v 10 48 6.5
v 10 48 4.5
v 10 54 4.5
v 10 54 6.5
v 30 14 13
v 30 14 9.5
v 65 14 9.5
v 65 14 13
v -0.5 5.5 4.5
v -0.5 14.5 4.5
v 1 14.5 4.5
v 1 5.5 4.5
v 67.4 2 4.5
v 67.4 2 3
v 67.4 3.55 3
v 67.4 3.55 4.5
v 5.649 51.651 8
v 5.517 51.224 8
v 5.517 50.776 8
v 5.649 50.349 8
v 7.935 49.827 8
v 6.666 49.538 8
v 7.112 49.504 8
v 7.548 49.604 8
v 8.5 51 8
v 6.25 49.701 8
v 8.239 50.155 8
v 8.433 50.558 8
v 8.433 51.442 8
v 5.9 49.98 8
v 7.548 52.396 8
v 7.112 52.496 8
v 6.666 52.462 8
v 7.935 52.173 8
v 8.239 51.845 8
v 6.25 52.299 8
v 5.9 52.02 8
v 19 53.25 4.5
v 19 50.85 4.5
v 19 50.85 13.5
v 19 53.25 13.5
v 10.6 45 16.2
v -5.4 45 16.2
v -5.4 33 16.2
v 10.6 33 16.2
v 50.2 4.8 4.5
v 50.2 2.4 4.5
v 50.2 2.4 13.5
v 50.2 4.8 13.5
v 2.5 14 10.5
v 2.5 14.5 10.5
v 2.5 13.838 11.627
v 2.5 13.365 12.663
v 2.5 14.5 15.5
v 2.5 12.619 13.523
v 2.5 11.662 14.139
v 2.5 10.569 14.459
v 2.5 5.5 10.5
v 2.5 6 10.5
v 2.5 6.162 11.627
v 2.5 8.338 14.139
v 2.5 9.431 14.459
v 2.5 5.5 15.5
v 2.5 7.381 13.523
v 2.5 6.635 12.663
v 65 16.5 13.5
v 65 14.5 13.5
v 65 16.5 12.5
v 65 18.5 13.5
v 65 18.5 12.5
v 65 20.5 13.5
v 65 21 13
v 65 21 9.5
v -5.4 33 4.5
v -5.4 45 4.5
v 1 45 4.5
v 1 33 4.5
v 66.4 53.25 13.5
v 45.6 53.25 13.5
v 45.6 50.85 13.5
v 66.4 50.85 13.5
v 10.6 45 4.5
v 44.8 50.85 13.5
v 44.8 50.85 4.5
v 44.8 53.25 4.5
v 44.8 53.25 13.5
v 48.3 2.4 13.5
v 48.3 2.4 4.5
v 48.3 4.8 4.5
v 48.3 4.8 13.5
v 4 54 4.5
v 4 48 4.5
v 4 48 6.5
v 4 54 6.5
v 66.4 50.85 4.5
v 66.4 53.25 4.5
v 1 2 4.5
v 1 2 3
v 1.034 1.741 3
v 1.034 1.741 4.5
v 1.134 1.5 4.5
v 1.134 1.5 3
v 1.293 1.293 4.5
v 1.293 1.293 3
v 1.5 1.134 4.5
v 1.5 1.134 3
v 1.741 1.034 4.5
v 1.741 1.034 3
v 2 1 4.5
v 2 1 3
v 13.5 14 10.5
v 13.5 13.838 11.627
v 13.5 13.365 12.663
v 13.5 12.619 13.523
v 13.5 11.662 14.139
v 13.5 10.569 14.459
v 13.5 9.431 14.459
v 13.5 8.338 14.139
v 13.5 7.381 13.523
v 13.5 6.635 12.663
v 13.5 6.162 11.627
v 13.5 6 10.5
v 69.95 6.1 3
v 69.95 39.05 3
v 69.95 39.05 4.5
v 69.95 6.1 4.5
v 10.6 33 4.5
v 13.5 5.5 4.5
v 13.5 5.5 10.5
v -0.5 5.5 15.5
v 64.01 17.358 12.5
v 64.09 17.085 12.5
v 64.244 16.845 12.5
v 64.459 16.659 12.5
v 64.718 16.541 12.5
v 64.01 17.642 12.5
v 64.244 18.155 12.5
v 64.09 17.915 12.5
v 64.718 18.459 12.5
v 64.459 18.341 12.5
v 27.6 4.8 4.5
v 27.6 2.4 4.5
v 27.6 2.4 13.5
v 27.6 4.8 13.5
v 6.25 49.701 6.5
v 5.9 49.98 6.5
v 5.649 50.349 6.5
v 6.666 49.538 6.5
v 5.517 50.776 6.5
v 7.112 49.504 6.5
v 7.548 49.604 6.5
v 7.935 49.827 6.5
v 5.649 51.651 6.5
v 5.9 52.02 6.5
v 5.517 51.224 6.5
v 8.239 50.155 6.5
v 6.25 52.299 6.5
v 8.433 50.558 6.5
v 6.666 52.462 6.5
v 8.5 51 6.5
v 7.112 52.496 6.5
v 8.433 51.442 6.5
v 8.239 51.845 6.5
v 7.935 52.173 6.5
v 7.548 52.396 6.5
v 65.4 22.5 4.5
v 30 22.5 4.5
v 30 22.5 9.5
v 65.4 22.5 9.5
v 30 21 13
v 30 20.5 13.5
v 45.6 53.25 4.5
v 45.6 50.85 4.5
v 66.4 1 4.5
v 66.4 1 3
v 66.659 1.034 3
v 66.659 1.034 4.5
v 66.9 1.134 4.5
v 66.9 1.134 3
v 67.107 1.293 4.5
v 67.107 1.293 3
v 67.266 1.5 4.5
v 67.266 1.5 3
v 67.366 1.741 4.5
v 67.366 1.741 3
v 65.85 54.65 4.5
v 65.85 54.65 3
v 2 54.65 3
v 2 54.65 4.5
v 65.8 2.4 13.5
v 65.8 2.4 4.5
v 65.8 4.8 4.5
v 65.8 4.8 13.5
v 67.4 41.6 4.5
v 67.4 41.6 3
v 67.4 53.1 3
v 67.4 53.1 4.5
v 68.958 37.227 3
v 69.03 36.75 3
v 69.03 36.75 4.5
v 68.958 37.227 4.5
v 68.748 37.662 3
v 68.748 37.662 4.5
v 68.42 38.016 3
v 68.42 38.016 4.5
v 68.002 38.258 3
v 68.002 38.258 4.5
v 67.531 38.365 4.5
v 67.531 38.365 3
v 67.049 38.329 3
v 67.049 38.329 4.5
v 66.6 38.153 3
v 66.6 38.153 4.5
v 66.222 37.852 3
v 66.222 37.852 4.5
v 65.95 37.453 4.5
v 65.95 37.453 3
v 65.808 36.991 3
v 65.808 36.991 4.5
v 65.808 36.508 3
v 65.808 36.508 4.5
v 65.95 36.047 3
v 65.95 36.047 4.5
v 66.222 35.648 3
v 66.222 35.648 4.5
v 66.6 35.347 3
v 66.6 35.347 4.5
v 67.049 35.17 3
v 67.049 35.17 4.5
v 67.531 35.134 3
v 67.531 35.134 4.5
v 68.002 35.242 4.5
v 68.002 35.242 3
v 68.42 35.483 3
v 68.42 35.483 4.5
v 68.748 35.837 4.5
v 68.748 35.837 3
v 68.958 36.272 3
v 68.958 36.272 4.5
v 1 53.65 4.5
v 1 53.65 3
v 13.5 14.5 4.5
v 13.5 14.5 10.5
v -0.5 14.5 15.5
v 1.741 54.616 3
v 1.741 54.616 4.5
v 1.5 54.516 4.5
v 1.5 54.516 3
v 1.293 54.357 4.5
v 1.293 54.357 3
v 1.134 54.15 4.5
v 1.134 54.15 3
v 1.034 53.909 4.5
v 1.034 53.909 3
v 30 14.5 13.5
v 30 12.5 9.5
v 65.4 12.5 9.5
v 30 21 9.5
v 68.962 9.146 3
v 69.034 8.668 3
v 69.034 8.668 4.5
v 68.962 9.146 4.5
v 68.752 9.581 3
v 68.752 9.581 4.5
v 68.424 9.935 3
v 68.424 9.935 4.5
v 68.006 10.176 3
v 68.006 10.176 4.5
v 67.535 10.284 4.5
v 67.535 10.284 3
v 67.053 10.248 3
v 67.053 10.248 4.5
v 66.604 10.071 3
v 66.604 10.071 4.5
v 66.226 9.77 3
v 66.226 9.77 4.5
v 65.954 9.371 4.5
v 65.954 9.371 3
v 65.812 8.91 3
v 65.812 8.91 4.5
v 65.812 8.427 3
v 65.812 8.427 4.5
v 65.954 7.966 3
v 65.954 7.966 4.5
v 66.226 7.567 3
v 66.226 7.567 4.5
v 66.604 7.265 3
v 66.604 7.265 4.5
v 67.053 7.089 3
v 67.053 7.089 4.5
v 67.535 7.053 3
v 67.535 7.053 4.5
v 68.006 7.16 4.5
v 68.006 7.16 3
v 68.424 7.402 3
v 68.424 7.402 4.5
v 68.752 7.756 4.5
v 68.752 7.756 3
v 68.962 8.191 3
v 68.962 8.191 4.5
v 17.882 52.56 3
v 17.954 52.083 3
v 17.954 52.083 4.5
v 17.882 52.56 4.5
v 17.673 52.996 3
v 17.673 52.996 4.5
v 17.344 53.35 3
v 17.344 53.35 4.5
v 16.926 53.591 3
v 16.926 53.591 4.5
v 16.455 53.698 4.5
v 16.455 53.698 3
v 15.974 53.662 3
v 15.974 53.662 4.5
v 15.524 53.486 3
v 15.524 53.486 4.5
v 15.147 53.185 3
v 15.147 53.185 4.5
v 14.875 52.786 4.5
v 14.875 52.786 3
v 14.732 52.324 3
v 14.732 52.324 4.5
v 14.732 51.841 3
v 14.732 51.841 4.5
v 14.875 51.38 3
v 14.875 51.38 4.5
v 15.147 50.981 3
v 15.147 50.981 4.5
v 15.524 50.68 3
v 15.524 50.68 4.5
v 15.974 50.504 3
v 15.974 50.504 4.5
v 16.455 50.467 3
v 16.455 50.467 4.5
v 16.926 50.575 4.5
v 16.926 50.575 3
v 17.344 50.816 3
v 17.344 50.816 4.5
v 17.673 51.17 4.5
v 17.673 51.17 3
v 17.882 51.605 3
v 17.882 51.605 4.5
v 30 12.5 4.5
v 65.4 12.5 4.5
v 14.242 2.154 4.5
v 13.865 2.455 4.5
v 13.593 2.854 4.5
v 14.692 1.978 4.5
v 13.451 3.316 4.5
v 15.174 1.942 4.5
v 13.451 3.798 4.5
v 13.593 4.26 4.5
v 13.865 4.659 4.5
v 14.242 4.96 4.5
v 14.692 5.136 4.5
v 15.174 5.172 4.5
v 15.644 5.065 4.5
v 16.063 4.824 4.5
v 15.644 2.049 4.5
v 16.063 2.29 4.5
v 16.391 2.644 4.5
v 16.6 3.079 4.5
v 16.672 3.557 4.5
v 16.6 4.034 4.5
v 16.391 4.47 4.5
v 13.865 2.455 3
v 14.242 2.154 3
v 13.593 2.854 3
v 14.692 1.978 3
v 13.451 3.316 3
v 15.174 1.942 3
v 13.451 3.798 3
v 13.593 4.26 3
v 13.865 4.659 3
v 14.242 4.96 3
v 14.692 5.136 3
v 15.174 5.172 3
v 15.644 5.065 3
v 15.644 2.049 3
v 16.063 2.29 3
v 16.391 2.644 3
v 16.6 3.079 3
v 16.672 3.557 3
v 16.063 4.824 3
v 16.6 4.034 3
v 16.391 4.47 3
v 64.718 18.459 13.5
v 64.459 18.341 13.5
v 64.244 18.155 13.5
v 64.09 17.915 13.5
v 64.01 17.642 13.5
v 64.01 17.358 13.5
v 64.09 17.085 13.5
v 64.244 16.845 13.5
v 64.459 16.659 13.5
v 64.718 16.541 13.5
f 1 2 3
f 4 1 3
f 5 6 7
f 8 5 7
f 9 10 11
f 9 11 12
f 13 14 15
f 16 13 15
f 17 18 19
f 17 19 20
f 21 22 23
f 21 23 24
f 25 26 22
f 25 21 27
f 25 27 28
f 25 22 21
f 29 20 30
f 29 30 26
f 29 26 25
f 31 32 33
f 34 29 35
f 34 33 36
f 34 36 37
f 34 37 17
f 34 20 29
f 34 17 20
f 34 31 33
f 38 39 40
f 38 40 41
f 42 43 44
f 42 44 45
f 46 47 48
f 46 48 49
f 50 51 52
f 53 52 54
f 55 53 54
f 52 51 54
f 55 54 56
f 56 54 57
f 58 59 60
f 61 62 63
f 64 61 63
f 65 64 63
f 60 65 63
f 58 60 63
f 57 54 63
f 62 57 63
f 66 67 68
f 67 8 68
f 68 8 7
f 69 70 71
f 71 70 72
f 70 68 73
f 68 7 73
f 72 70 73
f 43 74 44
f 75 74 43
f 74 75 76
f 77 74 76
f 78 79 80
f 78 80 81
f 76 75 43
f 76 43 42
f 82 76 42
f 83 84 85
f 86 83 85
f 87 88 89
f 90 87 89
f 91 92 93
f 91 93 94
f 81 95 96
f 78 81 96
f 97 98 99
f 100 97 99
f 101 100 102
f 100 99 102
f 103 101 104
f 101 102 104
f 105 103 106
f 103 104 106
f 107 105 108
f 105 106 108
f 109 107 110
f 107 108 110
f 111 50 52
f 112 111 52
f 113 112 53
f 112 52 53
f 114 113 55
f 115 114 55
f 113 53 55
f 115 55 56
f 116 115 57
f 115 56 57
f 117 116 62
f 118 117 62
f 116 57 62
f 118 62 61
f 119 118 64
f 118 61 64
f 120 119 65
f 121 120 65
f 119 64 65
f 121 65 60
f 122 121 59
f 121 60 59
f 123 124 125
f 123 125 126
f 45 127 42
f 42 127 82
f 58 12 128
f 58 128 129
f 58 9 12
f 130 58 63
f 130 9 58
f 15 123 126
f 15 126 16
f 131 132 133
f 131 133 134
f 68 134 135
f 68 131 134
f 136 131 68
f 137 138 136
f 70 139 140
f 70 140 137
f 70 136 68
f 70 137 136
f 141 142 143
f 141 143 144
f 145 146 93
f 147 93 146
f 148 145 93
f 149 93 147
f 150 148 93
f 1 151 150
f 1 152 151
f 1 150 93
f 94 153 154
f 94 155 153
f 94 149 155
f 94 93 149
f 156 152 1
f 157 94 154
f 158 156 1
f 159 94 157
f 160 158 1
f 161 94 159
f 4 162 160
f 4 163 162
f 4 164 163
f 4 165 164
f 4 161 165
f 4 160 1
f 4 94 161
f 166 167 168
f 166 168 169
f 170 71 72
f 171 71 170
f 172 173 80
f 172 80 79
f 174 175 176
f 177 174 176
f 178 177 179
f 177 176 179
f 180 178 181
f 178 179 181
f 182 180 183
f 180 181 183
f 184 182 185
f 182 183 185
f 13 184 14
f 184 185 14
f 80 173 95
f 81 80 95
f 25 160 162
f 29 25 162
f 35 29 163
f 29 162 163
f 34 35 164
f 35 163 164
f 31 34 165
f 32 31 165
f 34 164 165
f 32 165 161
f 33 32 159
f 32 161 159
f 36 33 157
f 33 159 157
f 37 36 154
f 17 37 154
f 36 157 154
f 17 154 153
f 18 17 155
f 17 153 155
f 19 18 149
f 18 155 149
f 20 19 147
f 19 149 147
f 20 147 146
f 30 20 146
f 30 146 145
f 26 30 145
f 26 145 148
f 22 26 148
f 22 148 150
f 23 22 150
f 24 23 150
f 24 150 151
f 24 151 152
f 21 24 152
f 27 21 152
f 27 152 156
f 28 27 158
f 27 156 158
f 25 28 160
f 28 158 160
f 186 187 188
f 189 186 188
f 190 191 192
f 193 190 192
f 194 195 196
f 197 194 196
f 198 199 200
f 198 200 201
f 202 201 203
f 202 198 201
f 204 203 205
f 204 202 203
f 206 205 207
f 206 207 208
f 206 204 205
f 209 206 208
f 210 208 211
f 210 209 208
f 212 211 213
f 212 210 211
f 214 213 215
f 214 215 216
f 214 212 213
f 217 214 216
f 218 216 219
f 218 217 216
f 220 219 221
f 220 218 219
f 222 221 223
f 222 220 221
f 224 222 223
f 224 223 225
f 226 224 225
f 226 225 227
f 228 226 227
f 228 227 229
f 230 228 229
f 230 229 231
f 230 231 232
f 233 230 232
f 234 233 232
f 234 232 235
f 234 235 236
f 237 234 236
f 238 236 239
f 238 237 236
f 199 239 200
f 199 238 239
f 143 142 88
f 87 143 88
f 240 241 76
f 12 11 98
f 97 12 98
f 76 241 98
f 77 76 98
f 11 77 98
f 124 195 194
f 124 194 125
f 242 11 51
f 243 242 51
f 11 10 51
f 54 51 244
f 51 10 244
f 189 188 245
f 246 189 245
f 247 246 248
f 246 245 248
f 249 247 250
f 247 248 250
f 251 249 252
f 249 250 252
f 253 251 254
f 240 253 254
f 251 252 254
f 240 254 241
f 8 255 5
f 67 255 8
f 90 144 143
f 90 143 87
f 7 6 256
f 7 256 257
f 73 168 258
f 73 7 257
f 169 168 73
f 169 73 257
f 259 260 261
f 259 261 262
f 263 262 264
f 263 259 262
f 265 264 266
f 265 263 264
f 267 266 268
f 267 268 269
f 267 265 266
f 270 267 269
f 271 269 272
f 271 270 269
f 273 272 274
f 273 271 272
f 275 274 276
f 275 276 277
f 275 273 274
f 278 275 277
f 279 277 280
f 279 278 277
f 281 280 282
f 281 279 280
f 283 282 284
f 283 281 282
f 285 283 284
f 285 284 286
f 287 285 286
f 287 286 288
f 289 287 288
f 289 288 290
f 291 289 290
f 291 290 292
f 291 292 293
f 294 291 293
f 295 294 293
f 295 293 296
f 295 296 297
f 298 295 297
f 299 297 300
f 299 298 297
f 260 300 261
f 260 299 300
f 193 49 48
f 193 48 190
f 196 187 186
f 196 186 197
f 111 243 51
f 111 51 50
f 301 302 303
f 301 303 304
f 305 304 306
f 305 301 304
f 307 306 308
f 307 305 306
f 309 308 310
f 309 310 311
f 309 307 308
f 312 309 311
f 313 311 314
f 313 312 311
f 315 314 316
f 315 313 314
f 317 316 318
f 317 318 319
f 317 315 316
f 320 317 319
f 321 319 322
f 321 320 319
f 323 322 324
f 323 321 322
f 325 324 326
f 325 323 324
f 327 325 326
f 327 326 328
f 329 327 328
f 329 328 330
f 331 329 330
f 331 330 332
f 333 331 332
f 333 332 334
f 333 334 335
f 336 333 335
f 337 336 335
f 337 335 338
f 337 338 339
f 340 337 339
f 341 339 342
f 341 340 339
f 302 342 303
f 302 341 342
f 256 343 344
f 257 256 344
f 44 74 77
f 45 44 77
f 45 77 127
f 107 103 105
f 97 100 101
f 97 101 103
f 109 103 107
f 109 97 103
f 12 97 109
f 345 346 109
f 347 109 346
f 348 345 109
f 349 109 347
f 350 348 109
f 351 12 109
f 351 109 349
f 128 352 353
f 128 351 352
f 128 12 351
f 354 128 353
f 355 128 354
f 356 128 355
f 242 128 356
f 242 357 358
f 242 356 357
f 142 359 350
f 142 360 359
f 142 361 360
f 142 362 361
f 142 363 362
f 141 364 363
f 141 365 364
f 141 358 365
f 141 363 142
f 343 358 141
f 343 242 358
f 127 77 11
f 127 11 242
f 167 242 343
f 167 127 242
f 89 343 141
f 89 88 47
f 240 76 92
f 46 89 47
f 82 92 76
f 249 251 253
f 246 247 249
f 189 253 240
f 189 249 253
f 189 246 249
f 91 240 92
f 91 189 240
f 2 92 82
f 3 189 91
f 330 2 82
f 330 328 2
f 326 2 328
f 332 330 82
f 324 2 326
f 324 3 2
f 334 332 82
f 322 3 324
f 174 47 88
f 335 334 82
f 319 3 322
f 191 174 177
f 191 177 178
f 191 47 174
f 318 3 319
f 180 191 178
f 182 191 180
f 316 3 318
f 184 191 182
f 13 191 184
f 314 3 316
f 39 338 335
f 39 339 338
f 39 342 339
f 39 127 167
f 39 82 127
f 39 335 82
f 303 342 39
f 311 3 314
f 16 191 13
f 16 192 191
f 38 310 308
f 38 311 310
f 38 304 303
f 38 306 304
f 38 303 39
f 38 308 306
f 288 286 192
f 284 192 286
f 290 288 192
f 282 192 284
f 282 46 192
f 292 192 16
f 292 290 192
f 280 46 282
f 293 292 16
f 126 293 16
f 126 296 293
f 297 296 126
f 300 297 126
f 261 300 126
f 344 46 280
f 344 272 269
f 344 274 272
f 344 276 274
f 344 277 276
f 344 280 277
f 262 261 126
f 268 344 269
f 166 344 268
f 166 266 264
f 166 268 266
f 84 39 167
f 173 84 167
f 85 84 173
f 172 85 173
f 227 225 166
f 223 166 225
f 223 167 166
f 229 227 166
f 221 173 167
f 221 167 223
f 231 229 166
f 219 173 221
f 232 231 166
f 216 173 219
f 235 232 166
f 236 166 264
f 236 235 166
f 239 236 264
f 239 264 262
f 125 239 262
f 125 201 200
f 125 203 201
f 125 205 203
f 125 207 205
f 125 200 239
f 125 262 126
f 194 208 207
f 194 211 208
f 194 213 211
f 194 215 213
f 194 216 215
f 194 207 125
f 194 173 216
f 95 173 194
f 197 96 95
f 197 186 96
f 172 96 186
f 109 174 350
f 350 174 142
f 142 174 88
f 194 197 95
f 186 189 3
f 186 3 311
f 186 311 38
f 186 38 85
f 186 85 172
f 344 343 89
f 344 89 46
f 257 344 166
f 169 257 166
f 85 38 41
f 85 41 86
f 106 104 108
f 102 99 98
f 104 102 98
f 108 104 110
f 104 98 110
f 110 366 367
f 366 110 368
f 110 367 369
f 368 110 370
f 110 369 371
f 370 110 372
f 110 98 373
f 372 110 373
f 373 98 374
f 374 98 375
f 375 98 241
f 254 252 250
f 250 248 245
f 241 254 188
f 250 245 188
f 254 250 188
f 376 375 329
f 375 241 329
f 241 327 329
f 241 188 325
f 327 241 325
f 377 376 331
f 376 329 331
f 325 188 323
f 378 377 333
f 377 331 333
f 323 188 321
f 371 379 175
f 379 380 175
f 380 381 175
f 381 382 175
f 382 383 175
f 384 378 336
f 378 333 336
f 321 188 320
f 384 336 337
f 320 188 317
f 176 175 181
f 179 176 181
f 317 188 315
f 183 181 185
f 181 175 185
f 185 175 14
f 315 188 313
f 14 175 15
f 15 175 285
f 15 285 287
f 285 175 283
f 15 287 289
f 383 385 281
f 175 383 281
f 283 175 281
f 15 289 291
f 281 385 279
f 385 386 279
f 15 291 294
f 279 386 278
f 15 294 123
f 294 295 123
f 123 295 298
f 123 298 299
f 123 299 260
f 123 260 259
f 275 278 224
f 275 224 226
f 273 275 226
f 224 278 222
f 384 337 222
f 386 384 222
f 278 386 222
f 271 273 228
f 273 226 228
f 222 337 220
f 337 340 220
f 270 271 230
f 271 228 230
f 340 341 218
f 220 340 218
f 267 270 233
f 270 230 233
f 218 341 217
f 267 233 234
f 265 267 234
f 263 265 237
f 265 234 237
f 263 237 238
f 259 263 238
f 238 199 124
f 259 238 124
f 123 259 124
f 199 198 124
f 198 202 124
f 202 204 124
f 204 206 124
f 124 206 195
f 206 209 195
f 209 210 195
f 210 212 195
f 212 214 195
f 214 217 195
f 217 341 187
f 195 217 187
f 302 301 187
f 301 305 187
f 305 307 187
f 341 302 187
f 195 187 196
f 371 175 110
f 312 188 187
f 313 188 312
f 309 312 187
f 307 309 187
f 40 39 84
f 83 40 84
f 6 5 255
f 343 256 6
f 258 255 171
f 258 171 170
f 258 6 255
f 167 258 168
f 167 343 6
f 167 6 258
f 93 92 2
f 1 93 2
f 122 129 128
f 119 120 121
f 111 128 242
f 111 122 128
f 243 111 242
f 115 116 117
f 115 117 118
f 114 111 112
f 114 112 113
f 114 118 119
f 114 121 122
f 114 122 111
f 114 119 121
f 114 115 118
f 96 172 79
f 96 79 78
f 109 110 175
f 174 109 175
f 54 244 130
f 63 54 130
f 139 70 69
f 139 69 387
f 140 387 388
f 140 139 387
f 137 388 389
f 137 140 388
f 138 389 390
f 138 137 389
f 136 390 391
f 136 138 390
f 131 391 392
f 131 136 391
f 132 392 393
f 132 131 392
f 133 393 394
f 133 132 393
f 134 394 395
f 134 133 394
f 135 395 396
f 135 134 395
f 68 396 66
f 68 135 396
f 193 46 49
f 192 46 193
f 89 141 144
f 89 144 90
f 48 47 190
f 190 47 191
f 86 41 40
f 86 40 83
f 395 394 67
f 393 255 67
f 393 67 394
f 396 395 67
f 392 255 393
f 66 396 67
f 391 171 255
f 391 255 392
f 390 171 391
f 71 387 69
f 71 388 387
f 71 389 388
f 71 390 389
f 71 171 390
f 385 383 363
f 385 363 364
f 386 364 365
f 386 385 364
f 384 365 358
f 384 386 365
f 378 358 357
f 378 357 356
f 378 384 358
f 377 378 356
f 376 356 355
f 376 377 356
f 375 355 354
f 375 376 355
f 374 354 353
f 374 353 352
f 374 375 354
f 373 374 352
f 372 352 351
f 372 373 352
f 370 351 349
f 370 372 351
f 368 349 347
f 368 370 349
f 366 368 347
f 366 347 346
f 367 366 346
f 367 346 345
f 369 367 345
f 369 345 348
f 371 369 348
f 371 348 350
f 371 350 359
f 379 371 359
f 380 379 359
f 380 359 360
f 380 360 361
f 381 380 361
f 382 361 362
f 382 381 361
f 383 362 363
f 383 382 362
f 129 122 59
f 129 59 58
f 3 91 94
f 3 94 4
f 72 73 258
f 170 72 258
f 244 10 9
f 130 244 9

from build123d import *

# Parameters (mm, degrees)
SKETCH_R                   = 1.62
EXTRUDE_SKETCH_DEPTH       = 1.5
RECTANGLE004_W             = 20.8
RECTANGLE004_H             = 2.4
EXTRUDE_RECTANGLE004_DEPTH = 9
EXTRUDE_SKETCH002_DEPTH    = 1
SKETCH001_W                = 35
SKETCH001_H                = 7
EXTRUDE_SKETCH001_DEPTH    = 3
CHAMFER_SIZE               = 0.5
RECTANGLE006_W             = 35.4
RECTANGLE006_H             = 10
EXTRUDE_RECTANGLE006_DEPTH = 5
RECTANGLE001_W             = 15.6
RECTANGLE001_H             = 2.4
EXTRUDE_RECTANGLE001_DEPTH = 9
RECTANGLE_W                = 20.7
RECTANGLE_H                = 2.4
EXTRUDE_RECTANGLE_DEPTH    = 9
RECTANGLE009_W             = 9
RECTANGLE009_H             = 11
EXTRUDE_RECTANGLE009_DEPTH = 3
EXTRUDE_SKETCH005_DEPTH    = 11
RECTANGLE008_W             = 16
RECTANGLE008_H             = 12
EXTRUDE_RECTANGLE008_DEPTH = 11.7
SKETCH003_W                = 6
SKETCH003_H                = 6
EXTRUDE_SKETCH003_DEPTH    = 2
SKETCH004_R                = 1.5
EXTRUDE_SKETCH004_DEPTH    = 1.5
RECTANGLE003_W             = 25.8
RECTANGLE003_H             = 2.4
EXTRUDE_RECTANGLE003_DEPTH = 9


with BuildPart() as sketch_extrude:
    # Sketch → Extrude_Sketch (new body)
    with BuildSketch(Plane.XY):
        with BuildLine():
            Line((1, 0), (65.4, 0))
            ThreePointArc((65.4, 0), (66.107107, 0.292893), (66.4, 1))
            Line((66.4, 1), (66.4, 2.55))
            Line((68.95, 5.1), (66.4, 2.55))
            Line((68.95, 38.05), (68.95, 5.1))
            Line((66.4, 40.6), (68.95, 38.05))
            Line((66.4, 40.6), (66.4, 52.1))
            Line((64.85, 53.65), (66.4, 52.1))
            Line((64.85, 53.65), (1, 53.65))
            ThreePointArc((1, 53.65), (0.292893, 53.357107), (0, 52.65))
            Line((0, 52.65), (0, 1))
            ThreePointArc((0, 1), (0.292893, 0.292893), (1, 0))
        make_face()
        with Locations((14.05247, 2.556984)):
            Circle(SKETCH_R, mode=Mode.SUBTRACT)
        with Locations((15.334135, 51.082933)):
            Circle(SKETCH_R, mode=Mode.SUBTRACT)
        with Locations((66.409951, 35.749834)):
            Circle(SKETCH_R, mode=Mode.SUBTRACT)
        with Locations((66.413926, 7.668398)):
            Circle(SKETCH_R, mode=Mode.SUBTRACT)
    extrude(amount=EXTRUDE_SKETCH_DEPTH)


with BuildPart() as rectangle004_extrude:
    # Rectangle004 (on Extrude_Sketch) → Extrude_Rectangle004 (new body)
    with BuildSketch(Plane(origin=(44.6, 49.85, 1.5), x_dir=(1, 0, 0), z_dir=(0, 0, 1))):
        with Locations((10.4, 1.2)):
            Rectangle(RECTANGLE004_W, RECTANGLE004_H)
    extrude(amount=EXTRUDE_RECTANGLE004_DEPTH)


with BuildPart() as sketch002_extrude:
    # Sketch002 (on Face6 of Extrude_Sketch001) → Extrude_Sketch002 (new body)
    with BuildSketch(Plane.XY.offset(9.5)):
        with BuildLine():
            Line((29, 13), (64, 13))
            Line((64, 13), (64, 15.5))
            ThreePointArc((64, 17.5), (63, 16.5), (64, 15.5))
            Line((64, 17.5), (64, 20))
            Line((64, 20), (29, 20))
            Line((29, 20), (29, 13))
        make_face()
    extrude(amount=EXTRUDE_SKETCH002_DEPTH)


with BuildPart() as chamfer_body:
    # Sketch001 (on Face6 of Extrude_Rectangle006) → Extrude_Sketch001 (new body)
    with BuildSketch(Plane.XY.offset(6.5)):
        with Locations((46.5, 16.5)):
            Rectangle(SKETCH001_W, SKETCH001_H)
    extrude(amount=EXTRUDE_SKETCH001_DEPTH)

    # Fusion: union Sketch002_Extrude
    add(sketch002_extrude.part)

    # Chamfer
    chamfer_edges = [chamfer_body.edges().sort_by_distance(p)[0] for p in [
        (46.5, 13, 10.5),
        (46.5, 20, 10.5),
    ]]
    chamfer(chamfer_edges, length=CHAMFER_SIZE)


with BuildPart() as rectangle006_extrude:
    # Rectangle006 (on Extrude_Sketch) → Extrude_Rectangle006 (new body)
    with BuildSketch(Plane(origin=(29, 11.5, 1.5), x_dir=(1, 0, 0), z_dir=(0, 0, 1))):
        with Locations((17.7, 5)):
            Rectangle(RECTANGLE006_W, RECTANGLE006_H)
    extrude(amount=EXTRUDE_RECTANGLE006_DEPTH)


with BuildPart() as rectangle001_extrude:
    # Rectangle001 (on Extrude_Sketch) → Extrude_Rectangle001 (new body)
    with BuildSketch(Plane(origin=(49.2, 1.4, 1.5), x_dir=(1, 0, 0), z_dir=(0, 0, 1))):
        with Locations((7.8, 1.2)):
            Rectangle(RECTANGLE001_W, RECTANGLE001_H)
    extrude(amount=EXTRUDE_RECTANGLE001_DEPTH)


with BuildPart() as rectangle_extrude:
    # Rectangle (on Extrude_Sketch) → Extrude_Rectangle (new body)
    with BuildSketch(Plane(origin=(26.6, 1.4, 1.5), x_dir=(1, 0, 0), z_dir=(0, 0, 1))):
        with Locations((10.35, 1.2)):
            Rectangle(RECTANGLE_W, RECTANGLE_H)
    extrude(amount=EXTRUDE_RECTANGLE_DEPTH)


with BuildPart() as rectangle009_extrude:
    # Rectangle009 (on Extrude_Sketch) → Extrude_Rectangle009 (new body)
    with BuildSketch(Plane(origin=(-1.5, 13.5, 1.5), x_dir=(0, -1, 0), z_dir=(-1, 0, 0))):
        with Locations((4.5, 5.5)):
            Rectangle(RECTANGLE009_W, RECTANGLE009_H)
    extrude(amount=-EXTRUDE_RECTANGLE009_DEPTH)


with BuildPart() as fusion001:
    # Sketch005 (on Face6 of Extrude_Rectangle009) → Extrude_Sketch005 (new body)
    with BuildSketch(Plane.YZ.offset(1.5)):
        with BuildLine():
            Line((4.5, 1.5), (13.5, 1.5))
            Line((13.5, 1.5), (13.5, 7.5))
            Line((13.5, 7.5), (13, 7.5))
            ThreePointArc((13, 7.5), (9, 11.5), (5, 7.5))
            Line((5, 7.5), (4.5, 7.5))
            Line((4.5, 7.5), (4.5, 1.5))
        make_face()
    extrude(amount=EXTRUDE_SKETCH005_DEPTH)

    # Fusion001: union Rectangle009_Extrude
    add(rectangle009_extrude.part)


with BuildPart() as rectangle008_extrude:
    # Rectangle008 → Extrude_Rectangle008 (new body)
    with BuildSketch(Plane(origin=(-6.4, 32, 1.5), x_dir=(1, 0, 0), z_dir=(0, 0, 1))):
        with Locations((8, 6)):
            Rectangle(RECTANGLE008_W, RECTANGLE008_H)
    extrude(amount=EXTRUDE_RECTANGLE008_DEPTH)


with BuildPart() as sketch003_extrude:
    # Sketch003 (on Face18 of Extrude_Sketch) → Extrude_Sketch003 (new body)
    with BuildSketch(Plane.XY.offset(1.5)):
        with Locations((6, 50)):
            Rectangle(SKETCH003_W, SKETCH003_H)
    extrude(amount=EXTRUDE_SKETCH003_DEPTH)


with BuildPart() as sketch004_extrude:
    # Sketch004 (on Face6 of Extrude_Sketch003) → Extrude_Sketch004 (new body)
    with BuildSketch(Plane.XY.offset(3.5)):
        with Locations((6, 50)):
            Circle(SKETCH004_R)
    extrude(amount=EXTRUDE_SKETCH004_DEPTH)


with BuildPart() as arduino:
    # Rectangle003 (on Extrude_Sketch) → Extrude_Rectangle003 (new body)
    with BuildSketch(Plane(origin=(18, 49.85, 1.5), x_dir=(1, 0, 0), z_dir=(0, 0, 1))):
        with Locations((12.9, 1.2)):
            Rectangle(RECTANGLE003_W, RECTANGLE003_H)
    extrude(amount=EXTRUDE_RECTANGLE003_DEPTH)

    # Fusion002: union Rectangle004_Extrude, Chamfer body, Rectangle006_Extrude, Rectangle001_Extrude, Rectangle_Extrude, Fusion001, Rectangle008_Extrude, Sketch003_Extrude, Sketch004_Extrude
    add(rectangle004_extrude.part)
    add(chamfer_body.part)
    add(rectangle006_extrude.part)
    add(rectangle001_extrude.part)
    add(rectangle_extrude.part)
    add(fusion001.part)
    add(rectangle008_extrude.part)
    add(sketch003_extrude.part)
    add(sketch004_extrude.part)

    # Fusion003: union Sketch_Extrude
    add(sketch_extrude.part)


with BuildPart() as arduino_1:
    # Fusion003 placement: moved
    add(arduino.part.moved(Location((1, 1, 3))))


solid = arduino_1.part
